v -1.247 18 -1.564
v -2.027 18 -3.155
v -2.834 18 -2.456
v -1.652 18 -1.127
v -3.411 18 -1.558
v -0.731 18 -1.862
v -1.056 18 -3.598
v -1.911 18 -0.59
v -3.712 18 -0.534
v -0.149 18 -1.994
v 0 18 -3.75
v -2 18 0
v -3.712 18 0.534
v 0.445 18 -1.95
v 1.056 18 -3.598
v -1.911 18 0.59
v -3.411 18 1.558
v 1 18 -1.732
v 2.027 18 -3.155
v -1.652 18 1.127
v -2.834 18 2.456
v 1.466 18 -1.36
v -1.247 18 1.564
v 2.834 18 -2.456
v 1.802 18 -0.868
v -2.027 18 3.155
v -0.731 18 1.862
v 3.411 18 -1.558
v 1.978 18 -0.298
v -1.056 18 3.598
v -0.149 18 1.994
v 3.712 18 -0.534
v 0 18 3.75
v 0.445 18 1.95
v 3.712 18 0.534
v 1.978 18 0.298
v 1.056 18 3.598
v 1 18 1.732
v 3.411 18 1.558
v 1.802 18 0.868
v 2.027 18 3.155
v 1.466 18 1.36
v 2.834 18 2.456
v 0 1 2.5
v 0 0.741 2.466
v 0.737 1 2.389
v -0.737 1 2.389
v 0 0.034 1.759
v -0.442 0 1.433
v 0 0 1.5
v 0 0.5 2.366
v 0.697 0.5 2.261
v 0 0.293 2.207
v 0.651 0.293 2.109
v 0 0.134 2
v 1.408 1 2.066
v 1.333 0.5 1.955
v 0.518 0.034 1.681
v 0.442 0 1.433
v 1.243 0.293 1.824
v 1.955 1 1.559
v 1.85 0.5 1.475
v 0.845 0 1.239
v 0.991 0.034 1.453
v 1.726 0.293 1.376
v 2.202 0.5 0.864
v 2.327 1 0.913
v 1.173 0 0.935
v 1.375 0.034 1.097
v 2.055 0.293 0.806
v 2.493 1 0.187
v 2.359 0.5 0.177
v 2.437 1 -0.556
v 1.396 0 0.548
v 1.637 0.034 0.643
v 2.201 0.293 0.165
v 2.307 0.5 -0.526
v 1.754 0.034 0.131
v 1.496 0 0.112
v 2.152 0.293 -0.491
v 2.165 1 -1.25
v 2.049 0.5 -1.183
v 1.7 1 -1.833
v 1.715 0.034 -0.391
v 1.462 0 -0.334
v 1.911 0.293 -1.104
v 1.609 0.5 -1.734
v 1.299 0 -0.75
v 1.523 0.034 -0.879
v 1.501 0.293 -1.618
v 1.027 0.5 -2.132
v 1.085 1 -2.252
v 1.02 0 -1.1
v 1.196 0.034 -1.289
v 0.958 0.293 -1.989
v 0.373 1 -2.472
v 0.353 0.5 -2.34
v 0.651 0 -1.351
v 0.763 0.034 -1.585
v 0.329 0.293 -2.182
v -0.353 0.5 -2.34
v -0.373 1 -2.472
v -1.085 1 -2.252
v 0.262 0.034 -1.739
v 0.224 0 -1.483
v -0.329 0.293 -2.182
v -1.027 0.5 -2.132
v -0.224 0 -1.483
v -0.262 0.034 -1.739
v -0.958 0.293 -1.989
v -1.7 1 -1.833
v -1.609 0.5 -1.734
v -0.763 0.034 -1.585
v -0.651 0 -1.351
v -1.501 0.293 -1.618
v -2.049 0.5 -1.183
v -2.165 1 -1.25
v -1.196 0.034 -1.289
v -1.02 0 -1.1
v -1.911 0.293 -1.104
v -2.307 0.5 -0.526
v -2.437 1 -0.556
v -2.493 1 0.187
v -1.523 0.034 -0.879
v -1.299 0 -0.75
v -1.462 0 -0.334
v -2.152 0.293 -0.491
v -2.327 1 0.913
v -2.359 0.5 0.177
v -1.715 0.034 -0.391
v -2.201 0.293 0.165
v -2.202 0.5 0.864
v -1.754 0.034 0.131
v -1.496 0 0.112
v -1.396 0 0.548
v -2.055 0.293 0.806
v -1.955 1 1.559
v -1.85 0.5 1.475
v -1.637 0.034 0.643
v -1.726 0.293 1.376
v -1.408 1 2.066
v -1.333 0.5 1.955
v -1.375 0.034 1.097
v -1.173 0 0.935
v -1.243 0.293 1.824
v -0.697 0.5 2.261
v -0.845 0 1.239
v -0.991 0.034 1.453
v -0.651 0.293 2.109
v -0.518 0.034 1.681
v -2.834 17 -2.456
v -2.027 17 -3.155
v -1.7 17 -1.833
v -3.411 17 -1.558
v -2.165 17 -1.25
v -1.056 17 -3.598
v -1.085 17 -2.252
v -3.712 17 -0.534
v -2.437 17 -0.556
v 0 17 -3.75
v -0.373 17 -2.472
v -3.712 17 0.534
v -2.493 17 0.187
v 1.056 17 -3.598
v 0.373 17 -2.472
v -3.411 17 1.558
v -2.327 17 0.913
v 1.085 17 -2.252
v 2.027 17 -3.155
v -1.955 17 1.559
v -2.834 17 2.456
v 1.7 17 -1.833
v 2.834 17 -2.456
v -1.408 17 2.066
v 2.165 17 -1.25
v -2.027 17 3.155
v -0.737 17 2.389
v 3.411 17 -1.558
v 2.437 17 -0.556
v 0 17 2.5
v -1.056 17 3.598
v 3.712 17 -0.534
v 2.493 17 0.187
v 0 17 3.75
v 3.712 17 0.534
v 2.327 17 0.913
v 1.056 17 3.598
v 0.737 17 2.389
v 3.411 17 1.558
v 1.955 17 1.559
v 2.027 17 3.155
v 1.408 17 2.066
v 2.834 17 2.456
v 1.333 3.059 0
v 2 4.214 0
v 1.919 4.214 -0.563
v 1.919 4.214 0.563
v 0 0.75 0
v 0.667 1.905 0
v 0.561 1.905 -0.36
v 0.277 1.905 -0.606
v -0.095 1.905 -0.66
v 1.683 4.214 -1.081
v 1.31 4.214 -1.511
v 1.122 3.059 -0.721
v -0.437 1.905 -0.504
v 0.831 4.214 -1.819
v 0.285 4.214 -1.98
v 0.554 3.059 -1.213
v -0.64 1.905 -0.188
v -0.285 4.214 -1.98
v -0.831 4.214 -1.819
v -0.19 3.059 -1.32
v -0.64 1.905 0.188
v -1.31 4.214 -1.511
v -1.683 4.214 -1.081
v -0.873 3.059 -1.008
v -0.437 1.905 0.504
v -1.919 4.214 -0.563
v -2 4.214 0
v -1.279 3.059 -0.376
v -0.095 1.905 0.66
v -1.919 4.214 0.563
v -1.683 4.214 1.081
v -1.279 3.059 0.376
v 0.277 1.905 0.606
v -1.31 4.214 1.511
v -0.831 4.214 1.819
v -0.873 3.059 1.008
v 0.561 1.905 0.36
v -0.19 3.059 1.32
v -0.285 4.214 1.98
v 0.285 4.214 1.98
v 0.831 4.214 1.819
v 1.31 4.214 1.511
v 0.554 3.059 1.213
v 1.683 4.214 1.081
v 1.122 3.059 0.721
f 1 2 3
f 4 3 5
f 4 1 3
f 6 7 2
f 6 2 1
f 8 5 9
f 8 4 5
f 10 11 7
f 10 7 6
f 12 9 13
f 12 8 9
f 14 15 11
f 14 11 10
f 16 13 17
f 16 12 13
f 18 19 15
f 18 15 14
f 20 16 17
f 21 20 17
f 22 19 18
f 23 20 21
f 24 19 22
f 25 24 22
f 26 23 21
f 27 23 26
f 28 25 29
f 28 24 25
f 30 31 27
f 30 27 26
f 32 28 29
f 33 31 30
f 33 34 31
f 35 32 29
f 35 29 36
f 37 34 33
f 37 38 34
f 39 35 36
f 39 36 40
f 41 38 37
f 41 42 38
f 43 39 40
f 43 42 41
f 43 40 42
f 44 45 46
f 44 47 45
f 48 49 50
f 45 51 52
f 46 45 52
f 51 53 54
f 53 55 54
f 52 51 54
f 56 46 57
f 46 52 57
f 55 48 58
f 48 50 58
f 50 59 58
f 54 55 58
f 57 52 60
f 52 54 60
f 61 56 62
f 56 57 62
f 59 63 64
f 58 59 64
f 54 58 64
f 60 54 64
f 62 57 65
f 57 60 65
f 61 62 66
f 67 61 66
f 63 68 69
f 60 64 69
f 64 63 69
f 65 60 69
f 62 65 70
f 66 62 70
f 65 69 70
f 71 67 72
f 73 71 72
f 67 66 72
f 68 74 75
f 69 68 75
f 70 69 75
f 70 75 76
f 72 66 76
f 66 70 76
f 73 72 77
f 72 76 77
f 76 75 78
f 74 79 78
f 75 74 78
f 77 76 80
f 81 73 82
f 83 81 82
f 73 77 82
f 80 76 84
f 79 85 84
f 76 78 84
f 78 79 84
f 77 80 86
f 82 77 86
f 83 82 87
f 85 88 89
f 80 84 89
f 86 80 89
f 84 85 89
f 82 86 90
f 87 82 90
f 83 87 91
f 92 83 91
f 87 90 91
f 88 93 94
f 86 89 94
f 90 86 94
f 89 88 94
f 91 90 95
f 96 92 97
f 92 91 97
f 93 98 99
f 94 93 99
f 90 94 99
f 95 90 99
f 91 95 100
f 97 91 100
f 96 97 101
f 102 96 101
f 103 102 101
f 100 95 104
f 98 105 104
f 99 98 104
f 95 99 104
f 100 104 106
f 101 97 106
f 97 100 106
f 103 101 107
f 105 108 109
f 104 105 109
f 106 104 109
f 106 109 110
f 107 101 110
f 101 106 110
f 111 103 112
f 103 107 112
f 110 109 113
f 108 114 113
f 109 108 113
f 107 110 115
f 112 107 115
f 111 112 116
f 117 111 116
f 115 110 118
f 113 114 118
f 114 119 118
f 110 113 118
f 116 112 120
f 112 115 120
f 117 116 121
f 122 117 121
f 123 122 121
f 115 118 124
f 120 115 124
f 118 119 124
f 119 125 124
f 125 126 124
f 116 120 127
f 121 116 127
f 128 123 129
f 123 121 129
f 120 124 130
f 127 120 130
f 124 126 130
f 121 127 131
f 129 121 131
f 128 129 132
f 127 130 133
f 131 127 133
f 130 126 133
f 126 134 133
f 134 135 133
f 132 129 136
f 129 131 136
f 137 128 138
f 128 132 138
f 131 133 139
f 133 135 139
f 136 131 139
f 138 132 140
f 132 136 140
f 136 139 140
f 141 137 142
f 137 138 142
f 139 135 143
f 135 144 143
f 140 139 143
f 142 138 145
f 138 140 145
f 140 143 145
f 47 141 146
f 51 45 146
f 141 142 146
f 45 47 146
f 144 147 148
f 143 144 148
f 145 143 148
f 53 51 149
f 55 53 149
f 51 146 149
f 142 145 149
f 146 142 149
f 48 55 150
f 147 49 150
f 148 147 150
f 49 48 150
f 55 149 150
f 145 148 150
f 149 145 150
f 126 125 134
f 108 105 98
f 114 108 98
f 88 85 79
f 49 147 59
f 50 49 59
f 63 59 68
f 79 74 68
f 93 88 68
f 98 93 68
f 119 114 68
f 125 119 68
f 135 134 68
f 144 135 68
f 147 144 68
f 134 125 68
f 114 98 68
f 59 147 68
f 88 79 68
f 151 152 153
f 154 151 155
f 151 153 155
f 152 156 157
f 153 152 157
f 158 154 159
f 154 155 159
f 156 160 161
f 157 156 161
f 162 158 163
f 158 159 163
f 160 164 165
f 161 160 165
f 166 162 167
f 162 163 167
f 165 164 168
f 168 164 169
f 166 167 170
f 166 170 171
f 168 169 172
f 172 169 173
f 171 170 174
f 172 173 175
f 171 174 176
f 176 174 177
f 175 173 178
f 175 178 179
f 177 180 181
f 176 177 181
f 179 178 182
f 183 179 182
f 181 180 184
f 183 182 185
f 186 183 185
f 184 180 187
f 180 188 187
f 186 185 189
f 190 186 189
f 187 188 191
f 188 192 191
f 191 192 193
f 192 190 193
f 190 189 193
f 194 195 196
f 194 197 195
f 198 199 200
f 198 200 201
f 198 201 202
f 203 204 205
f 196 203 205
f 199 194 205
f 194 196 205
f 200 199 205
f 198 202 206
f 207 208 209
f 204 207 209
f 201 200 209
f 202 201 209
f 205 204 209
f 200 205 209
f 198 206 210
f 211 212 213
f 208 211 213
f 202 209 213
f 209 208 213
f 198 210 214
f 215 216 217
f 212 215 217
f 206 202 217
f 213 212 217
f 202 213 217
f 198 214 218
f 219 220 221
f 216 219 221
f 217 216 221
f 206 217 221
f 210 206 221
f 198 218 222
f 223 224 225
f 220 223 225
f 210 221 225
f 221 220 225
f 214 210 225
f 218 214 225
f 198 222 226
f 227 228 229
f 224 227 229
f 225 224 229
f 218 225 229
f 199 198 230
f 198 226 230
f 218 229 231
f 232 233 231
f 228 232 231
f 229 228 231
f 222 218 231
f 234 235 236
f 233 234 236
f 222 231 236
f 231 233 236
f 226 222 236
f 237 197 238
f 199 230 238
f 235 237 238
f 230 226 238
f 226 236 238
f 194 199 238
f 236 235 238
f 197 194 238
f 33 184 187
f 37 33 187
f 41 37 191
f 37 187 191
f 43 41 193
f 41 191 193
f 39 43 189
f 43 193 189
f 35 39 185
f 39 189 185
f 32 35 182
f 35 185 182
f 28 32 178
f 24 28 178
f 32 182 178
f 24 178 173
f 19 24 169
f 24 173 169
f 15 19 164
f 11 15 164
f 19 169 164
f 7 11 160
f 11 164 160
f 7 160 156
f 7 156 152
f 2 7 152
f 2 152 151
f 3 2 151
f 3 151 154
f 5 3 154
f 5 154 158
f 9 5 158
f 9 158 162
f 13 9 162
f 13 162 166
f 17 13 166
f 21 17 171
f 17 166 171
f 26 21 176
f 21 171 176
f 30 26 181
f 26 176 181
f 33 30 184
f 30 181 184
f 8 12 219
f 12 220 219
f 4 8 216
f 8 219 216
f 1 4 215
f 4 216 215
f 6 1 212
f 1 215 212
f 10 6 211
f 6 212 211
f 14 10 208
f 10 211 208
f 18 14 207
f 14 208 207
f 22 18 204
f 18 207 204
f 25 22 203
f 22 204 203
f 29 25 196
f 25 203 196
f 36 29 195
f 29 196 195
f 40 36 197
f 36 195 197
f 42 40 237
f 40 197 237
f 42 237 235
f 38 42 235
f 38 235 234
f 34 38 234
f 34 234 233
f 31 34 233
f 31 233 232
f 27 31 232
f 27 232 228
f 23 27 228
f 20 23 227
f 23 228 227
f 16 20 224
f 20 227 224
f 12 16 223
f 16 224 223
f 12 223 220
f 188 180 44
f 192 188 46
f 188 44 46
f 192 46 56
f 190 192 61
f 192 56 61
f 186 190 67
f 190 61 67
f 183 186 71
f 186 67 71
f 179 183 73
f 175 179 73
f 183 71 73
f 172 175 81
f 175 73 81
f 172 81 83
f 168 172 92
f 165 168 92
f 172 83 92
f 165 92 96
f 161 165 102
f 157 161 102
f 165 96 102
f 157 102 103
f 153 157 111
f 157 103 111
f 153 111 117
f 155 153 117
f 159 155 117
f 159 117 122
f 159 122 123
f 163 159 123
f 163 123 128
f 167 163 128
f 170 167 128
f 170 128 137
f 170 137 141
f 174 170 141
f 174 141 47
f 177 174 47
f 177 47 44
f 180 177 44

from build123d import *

# Parameters (mm, degrees)
SKETCH2_R                 = 2.5
BOSS_EXTRUDE1_DEPTH       = 18
FILLET3_R                 = 1
BOSS_EXTRUDE2_START       = -1
SKETCH5_R                 = 3.75
SKETCH5_R_2               = 2.5
BOSS_EXTRUDE2_DEPTH       = 1
F_1_0MM_DOWEL_HOLE1_D     = 4
F_1_0MM_DOWEL_HOLE1_DEPTH = 13.785898385
F_1_0MM_DOWEL_HOLE1_TIP   = 3.464101615


with BuildPart() as part:
    # Sketch2 → Boss-Extrude1 (new body)
    with BuildSketch(Plane(origin=(0, 0, 0), x_dir=(1, 0, 0), z_dir=(0, 1, 0))):
        with Locations(Location((0, 0, 0), (0, 0, 270))):
            Circle(SKETCH2_R)
    extrude(amount=BOSS_EXTRUDE1_DEPTH)

    # Fillet3
    fillet3_edges = [part.edges().sort_by_distance(p)[0] for p in [
        (0, 0, -2.5),
    ]]
    fillet(fillet3_edges, radius=FILLET3_R)

    # Sketch5 → Boss-Extrude2 (add)
    with BuildSketch(Plane(origin=(0, 18, 0), x_dir=(1, 0, 0), z_dir=(0, 1, 0)).offset(BOSS_EXTRUDE2_START)):
        with Locations(Location((0, 0, 0), (0, 0, 270))):
            Circle(SKETCH5_R)
        with Locations(Location((0, 0, 0), (0, 0, 270))):
            Circle(SKETCH5_R_2, mode=Mode.SUBTRACT)
    extrude(amount=BOSS_EXTRUDE2_DEPTH)

    # Ø1.0mm Dowel Hole1
    with Locations(Plane(origin=(0, 18, 0), x_dir=(1, 0, 0), z_dir=(0, 1, 0))):
        with Locations((0, 0)):
            Hole(F_1_0MM_DOWEL_HOLE1_D / 2, depth=F_1_0MM_DOWEL_HOLE1_DEPTH)
            with Locations((0, 0, -(F_1_0MM_DOWEL_HOLE1_DEPTH + F_1_0MM_DOWEL_HOLE1_TIP / 2))):  # 60° drill point
                Cone(0, F_1_0MM_DOWEL_HOLE1_D / 2, F_1_0MM_DOWEL_HOLE1_TIP, mode=Mode.SUBTRACT)


solid = part.part
